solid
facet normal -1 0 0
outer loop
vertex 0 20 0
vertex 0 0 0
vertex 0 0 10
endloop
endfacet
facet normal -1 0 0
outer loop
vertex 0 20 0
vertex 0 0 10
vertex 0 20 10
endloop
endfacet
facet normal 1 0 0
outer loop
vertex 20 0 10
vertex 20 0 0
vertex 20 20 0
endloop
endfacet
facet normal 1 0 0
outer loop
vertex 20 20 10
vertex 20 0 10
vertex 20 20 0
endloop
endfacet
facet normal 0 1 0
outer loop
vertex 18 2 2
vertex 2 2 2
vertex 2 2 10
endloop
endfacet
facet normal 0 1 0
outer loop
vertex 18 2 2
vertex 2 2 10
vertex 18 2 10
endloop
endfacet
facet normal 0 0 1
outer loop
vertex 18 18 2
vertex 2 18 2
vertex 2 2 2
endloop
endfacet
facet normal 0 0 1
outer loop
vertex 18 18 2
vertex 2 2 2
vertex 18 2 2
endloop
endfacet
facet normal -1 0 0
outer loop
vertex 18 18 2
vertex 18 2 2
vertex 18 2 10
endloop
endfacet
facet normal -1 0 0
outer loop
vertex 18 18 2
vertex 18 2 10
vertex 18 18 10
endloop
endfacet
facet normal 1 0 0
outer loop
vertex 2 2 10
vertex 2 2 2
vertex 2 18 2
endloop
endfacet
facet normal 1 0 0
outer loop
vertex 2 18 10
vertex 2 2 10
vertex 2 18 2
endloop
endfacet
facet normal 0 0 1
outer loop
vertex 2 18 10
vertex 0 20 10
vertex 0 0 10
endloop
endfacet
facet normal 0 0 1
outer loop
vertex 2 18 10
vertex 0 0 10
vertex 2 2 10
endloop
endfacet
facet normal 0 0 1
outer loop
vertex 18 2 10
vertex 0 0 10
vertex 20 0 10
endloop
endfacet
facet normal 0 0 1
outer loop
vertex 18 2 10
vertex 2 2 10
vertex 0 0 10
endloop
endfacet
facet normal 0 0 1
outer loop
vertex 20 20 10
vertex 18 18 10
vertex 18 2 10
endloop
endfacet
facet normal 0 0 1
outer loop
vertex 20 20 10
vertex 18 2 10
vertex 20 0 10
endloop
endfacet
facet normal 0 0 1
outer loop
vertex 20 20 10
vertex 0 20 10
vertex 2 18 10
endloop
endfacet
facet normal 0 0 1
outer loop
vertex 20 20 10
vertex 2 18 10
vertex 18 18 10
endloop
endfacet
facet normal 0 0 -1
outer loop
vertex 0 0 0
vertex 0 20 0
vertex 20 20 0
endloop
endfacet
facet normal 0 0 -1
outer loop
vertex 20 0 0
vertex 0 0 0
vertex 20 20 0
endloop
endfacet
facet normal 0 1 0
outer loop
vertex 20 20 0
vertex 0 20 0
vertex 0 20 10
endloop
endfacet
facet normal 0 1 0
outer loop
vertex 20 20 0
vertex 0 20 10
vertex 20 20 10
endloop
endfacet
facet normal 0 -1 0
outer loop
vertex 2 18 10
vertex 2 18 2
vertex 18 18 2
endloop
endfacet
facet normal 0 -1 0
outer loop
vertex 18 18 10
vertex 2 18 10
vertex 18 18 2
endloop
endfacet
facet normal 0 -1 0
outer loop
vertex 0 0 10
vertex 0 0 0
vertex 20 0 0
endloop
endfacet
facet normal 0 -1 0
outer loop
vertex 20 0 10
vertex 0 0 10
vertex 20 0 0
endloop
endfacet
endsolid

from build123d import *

# Parameters (mm, degrees)
SKETCH_1_W    = 20
SKETCH_1_H    = 20
BASEBOX_DEPTH = 10
SHELL_T       = -2


with BuildPart() as part:
    # 草图1 → BaseBox (new body)
    with BuildSketch(Plane.XY):
        with Locations((10, 10)):
            Rectangle(SKETCH_1_W, SKETCH_1_H)
    extrude(amount=BASEBOX_DEPTH)

    # Shell
    shell_openings = [part.faces().sort_by_distance(p)[0] for p in [
        (10, 10, 10),
    ]]
    offset(amount=SHELL_T, openings=shell_openings, kind=Kind.INTERSECTION)


solid = part.part
